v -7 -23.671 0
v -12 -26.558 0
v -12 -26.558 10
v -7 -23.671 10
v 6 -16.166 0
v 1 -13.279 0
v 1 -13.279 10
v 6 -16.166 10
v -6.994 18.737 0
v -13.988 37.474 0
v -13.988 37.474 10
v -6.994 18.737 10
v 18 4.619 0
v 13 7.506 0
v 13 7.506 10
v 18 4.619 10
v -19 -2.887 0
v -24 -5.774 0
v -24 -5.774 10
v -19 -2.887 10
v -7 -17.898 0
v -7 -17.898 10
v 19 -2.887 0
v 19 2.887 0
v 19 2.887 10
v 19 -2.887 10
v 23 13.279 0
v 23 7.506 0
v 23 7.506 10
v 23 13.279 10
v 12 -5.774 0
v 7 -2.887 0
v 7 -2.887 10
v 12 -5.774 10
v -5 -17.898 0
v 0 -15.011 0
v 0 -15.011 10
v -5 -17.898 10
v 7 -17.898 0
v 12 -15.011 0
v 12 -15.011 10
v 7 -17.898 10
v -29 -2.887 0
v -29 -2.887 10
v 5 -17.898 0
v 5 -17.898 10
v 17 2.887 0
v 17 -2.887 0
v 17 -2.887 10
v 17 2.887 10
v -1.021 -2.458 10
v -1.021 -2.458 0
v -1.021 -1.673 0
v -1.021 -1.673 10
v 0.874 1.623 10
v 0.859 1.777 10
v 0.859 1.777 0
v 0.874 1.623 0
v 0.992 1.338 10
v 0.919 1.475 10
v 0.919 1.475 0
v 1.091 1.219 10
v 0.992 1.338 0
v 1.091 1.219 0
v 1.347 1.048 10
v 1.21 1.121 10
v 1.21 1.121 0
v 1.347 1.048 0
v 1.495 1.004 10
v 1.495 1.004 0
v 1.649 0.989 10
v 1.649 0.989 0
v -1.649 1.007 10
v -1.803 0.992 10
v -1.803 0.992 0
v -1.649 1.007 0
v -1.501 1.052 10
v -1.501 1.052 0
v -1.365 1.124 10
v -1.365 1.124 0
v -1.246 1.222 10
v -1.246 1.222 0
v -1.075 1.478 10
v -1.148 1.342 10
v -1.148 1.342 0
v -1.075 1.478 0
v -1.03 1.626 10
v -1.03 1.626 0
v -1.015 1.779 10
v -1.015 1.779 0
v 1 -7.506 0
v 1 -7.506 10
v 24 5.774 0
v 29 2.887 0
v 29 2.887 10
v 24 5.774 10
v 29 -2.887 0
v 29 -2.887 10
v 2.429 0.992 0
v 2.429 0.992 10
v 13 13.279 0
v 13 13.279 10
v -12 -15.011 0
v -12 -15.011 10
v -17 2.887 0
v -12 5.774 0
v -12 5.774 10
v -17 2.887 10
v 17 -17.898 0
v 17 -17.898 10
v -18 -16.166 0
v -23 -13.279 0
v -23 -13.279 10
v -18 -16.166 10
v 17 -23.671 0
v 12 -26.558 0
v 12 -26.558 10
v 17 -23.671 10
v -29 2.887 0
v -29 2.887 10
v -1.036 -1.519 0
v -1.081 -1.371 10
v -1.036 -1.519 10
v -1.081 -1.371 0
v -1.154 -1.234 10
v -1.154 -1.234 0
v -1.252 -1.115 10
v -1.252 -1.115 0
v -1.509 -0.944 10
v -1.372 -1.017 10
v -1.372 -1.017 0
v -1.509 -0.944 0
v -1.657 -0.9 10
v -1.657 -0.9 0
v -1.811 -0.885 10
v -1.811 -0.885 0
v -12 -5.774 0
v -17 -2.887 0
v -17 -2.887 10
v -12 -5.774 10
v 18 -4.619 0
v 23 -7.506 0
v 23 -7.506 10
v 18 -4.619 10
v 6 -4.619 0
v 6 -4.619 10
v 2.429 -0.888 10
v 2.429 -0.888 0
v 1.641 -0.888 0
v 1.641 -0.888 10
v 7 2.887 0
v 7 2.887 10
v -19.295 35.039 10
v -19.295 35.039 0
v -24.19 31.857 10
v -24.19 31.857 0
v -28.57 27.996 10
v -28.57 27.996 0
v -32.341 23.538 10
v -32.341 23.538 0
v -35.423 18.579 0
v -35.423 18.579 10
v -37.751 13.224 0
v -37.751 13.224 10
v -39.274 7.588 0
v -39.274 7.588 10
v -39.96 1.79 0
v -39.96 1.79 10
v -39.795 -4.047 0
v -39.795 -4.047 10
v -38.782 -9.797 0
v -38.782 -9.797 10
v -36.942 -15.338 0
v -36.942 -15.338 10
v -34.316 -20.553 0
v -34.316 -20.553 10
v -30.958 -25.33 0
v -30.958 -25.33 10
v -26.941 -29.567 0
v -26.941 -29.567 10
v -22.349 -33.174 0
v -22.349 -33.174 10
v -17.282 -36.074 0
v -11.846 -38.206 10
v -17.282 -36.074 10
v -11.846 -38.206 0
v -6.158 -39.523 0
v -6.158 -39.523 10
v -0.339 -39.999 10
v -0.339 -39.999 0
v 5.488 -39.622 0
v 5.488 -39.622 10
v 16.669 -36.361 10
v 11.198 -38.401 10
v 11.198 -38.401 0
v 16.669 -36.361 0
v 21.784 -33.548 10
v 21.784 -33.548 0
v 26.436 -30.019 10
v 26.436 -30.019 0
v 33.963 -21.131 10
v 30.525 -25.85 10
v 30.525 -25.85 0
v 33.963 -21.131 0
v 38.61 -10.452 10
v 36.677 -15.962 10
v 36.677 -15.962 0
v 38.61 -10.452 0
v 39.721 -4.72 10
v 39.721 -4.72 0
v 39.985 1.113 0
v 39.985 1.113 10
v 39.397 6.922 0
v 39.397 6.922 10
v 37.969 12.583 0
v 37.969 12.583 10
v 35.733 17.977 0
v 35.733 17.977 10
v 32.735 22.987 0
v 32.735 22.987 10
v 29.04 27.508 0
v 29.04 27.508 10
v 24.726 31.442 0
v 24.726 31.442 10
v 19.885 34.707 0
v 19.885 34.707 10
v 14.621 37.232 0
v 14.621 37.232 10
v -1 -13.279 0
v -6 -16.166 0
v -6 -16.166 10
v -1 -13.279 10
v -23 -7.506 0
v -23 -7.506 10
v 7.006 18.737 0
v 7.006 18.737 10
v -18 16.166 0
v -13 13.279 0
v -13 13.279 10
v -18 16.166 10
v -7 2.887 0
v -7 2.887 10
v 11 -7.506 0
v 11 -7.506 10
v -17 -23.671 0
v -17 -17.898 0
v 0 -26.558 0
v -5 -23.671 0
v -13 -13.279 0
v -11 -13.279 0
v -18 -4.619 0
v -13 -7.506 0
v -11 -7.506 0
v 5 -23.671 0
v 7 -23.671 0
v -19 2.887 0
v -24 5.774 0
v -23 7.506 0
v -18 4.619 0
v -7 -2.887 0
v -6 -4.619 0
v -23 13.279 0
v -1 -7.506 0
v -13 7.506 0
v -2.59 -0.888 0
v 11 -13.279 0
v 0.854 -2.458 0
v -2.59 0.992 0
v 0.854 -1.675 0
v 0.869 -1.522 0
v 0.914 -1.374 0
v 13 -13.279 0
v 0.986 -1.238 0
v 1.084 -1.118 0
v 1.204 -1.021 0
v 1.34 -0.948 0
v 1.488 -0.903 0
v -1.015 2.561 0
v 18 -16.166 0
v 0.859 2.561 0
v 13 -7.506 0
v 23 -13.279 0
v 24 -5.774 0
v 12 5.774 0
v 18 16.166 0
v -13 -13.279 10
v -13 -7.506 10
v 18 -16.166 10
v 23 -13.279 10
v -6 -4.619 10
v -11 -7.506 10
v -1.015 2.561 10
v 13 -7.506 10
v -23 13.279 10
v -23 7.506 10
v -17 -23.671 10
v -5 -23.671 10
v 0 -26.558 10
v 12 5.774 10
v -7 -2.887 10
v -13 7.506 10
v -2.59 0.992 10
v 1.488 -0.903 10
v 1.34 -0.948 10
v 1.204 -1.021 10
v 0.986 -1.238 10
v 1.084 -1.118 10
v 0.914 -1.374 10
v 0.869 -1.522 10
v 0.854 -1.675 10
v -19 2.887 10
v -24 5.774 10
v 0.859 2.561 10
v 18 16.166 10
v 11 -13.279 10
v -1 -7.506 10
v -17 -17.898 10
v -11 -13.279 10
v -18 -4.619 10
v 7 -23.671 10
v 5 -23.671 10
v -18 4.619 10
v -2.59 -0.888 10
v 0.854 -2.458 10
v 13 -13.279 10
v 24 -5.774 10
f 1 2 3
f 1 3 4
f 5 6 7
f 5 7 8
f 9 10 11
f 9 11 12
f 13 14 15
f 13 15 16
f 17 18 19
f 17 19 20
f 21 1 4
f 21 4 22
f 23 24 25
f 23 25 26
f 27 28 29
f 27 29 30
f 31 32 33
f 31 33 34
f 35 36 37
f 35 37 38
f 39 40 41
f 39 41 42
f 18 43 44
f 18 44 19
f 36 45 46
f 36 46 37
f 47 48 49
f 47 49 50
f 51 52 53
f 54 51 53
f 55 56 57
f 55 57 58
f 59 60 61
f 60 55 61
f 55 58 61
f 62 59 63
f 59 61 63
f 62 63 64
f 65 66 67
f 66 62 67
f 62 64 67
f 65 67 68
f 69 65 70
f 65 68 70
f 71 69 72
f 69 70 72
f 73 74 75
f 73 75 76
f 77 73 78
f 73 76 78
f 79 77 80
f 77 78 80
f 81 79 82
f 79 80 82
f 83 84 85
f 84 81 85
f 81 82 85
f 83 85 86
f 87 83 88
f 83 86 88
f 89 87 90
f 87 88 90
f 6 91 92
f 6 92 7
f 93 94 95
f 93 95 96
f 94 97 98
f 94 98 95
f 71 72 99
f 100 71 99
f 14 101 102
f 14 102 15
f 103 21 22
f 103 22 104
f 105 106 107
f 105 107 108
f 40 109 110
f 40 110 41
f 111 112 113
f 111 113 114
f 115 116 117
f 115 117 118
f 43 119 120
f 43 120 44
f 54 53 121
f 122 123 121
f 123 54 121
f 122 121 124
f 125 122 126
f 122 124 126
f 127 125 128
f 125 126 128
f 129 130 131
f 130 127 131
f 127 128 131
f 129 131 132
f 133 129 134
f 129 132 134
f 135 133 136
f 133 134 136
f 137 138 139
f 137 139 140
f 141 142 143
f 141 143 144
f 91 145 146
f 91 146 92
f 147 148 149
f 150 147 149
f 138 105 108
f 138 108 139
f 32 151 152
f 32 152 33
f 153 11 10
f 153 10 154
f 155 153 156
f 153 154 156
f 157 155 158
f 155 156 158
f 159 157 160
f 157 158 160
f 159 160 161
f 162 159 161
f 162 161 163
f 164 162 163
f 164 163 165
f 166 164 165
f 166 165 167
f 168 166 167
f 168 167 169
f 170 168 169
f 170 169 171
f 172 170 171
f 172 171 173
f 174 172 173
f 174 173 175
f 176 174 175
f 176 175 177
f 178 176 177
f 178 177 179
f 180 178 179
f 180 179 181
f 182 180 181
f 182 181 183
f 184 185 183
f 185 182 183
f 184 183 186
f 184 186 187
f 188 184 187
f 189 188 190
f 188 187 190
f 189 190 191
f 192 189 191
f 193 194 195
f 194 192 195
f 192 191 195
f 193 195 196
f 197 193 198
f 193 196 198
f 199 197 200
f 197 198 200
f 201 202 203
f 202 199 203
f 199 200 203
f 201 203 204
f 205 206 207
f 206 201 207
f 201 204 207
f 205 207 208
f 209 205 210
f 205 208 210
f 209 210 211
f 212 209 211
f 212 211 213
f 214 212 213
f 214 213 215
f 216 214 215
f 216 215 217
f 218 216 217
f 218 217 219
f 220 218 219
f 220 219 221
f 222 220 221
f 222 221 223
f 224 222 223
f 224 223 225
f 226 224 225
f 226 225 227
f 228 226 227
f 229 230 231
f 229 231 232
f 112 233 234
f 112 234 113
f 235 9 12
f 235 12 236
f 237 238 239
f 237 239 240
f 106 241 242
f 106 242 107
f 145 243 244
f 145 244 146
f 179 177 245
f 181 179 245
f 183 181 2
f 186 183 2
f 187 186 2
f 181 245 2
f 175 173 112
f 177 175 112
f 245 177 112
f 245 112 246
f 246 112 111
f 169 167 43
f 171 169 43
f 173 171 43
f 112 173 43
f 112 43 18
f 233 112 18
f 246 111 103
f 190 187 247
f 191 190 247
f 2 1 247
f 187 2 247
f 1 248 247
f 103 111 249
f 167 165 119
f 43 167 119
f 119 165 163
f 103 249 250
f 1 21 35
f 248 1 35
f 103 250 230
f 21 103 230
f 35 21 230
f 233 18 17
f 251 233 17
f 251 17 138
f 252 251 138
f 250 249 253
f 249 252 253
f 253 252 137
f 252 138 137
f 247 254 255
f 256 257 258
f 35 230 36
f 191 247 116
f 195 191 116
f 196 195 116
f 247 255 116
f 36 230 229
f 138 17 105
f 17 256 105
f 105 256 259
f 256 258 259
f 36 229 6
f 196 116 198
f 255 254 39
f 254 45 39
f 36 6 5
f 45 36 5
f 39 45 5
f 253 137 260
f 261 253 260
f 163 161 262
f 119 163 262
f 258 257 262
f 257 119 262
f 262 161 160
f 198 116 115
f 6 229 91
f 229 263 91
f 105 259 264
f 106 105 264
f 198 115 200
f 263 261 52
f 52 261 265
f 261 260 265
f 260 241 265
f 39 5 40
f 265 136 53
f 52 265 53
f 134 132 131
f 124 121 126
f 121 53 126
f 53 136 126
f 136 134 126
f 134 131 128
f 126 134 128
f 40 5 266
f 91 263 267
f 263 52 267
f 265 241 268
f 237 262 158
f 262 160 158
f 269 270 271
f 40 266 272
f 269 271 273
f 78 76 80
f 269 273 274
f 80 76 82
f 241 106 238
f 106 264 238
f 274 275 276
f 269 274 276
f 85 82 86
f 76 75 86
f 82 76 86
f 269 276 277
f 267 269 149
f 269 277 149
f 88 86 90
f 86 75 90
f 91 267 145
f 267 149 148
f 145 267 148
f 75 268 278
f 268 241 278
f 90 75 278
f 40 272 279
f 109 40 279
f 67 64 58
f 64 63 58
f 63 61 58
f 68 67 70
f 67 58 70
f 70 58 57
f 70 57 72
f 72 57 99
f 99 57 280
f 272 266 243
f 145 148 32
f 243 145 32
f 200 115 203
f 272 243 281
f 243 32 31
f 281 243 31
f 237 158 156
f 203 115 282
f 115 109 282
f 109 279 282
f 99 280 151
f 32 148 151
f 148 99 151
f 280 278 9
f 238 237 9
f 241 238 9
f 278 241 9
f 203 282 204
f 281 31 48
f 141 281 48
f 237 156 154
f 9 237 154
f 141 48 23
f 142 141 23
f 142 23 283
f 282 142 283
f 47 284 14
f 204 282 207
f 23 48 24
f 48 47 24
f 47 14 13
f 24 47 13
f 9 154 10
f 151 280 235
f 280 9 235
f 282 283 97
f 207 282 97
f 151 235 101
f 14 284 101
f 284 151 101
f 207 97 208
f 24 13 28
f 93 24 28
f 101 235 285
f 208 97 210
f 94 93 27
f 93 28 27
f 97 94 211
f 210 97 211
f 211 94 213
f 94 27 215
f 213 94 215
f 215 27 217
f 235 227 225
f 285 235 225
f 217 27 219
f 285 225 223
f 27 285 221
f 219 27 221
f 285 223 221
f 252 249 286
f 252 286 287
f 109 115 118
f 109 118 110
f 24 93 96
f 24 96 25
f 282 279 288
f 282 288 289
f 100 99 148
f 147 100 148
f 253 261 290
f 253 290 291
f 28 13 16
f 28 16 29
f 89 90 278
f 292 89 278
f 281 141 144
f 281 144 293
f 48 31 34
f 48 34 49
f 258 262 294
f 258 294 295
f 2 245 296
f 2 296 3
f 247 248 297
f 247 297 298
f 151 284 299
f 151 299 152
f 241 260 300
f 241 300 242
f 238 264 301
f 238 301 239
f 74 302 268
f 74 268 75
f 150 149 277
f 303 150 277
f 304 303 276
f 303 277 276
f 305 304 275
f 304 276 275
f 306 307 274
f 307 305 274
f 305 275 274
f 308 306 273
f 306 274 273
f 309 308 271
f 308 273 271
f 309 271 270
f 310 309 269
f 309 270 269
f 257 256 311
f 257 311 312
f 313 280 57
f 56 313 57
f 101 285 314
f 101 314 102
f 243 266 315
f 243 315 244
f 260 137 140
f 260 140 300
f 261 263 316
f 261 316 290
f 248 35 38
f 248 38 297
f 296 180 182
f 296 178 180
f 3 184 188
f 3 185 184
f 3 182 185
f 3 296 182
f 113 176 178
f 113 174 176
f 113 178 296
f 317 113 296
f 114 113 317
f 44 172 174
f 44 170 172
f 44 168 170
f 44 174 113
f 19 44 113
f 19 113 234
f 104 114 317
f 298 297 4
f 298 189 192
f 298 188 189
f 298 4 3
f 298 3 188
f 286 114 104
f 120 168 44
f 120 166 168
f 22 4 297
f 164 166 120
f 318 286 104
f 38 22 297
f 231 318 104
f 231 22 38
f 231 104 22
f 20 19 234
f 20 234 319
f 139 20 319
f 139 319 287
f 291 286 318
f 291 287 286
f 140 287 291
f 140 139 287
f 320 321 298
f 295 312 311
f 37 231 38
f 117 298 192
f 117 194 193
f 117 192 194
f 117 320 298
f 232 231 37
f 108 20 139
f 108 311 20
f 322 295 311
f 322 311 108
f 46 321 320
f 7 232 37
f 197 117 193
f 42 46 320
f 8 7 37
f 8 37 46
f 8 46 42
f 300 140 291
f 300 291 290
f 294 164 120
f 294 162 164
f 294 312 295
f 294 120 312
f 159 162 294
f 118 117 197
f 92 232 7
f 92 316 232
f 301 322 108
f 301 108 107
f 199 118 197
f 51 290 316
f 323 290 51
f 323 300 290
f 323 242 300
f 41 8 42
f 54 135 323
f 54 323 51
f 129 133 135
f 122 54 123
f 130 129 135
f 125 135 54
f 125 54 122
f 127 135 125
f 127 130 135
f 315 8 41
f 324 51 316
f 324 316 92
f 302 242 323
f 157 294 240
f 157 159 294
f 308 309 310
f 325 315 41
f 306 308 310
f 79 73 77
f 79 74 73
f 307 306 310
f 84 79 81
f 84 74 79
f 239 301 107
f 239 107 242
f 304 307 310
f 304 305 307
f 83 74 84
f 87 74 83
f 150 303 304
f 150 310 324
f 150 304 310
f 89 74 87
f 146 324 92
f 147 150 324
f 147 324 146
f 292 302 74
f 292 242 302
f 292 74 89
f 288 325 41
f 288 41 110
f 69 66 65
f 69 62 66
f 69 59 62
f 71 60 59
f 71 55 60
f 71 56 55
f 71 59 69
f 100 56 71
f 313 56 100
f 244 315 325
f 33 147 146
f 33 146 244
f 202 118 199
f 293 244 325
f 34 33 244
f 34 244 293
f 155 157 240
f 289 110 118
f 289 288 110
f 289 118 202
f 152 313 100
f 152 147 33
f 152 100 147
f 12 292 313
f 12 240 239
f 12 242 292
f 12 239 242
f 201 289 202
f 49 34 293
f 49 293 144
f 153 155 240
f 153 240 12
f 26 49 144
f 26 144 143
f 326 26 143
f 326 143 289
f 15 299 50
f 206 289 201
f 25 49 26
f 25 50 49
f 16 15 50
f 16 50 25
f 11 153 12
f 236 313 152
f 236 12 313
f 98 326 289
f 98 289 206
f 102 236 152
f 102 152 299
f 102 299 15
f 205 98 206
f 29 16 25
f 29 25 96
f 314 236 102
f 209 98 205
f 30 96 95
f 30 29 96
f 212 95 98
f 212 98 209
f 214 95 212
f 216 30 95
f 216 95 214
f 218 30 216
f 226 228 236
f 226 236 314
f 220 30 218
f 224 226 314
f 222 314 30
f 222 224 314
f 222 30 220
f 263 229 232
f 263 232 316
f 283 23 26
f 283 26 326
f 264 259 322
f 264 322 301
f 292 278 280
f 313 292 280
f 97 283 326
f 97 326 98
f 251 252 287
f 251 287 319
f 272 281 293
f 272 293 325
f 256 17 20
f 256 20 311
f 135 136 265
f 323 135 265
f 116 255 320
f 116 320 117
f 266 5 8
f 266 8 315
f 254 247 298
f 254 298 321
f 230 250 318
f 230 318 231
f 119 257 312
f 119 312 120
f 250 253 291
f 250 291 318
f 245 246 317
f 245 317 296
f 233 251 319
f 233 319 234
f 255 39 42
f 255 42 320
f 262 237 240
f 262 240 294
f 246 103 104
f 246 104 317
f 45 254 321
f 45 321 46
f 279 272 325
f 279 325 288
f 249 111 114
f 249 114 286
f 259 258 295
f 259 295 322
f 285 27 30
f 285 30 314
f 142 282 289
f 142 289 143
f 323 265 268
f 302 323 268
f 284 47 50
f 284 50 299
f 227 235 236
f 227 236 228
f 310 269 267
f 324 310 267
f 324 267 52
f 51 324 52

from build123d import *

# Parameters (mm, degrees)
SKETCH1_R                = 40
BOSS_EXTRUDE1_DEPTH      = 10
CUT_EXTRUDE8_DEPTH       = 99
CUT_EXTRUDE9_DEPTH       = 58.445626465
CUT_EXTRUDE9_DEPTH_BACK  = 58.445626465
CUT_EXTRUDE10_DEPTH      = 23
CUT_EXTRUDE10_DEPTH_BACK = 58.445626465


with BuildPart() as part:
    # Sketch1 → Boss-Extrude1 (new body)
    with BuildSketch(Plane.XY):
        Circle(SKETCH1_R)
    extrude(amount=BOSS_EXTRUDE1_DEPTH)

    # Sketch1<10> → Cut-Extrude8 (cut)
    with BuildSketch(Plane.XY):
        Polygon((17, 2.886751346), (12, 5.773502692), (7, 2.886751346), (7, -2.886751346), (12, -5.773502692), (17, -2.886751346), align=None)
        Polygon((29, 2.886751346), (24, 5.773502692), (19, 2.886751346), (19, -2.886751346), (24, -5.773502692), (29, -2.886751346), align=None)
        Polygon((-7, 2.886751346), (-12, 5.773502692), (-17, 2.886751346), (-17, -2.886751346), (-12, -5.773502692), (-7, -2.886751346), align=None)
        Polygon((-19, 2.886751346), (-24, 5.773502692), (-29, 2.886751346), (-29, -2.886751346), (-24, -5.773502692), (-19, -2.886751346), align=None)
        Polygon((-13, 13.279056191), (-18, 16.165807537), (-23, 13.279056191), (-23, 7.505553499), (-18, 4.618802154), (-13, 7.505553499), align=None)
        Polygon((23, 7.505553499), (23, 13.279056191), (18, 16.165807537), (13, 13.279056191), (13, 7.505553499), (18, 4.618802154), align=None)
        Polygon((-13, -13.279056191), (-13, -7.505553499), (-18, -4.618802154), (-23, -7.505553499), (-23, -13.279056191), (-18, -16.165807537), align=None)
        Polygon((-11, -13.279056191), (-6, -16.165807537), (-1, -13.279056191), (-1, -7.505553499), (-6, -4.618802154), (-11, -7.505553499), align=None)
        Polygon((6, -16.165807537), (11, -13.279056191), (11, -7.505553499), (6, -4.618802154), (1, -7.505553499), (1, -13.279056191), align=None)
        Polygon((13, -7.505553499), (13, -13.279056191), (18, -16.165807537), (23, -13.279056191), (23, -7.505553499), (18, -4.618802154), align=None)
        Polygon((-17, -23.671361037), (-12, -26.558112383), (-7, -23.671361037), (-7, -17.897858345), (-12, -15.011106999), (-17, -17.897858345), align=None)
        Polygon((0, -26.558112383), (5, -23.671361037), (5, -17.897858345), (0, -15.011106999), (-5, -17.897858345), (-5, -23.671361037), align=None)
        Polygon((7, -17.897858345), (7, -23.671361037), (12, -26.558112383), (17, -23.671361037), (17, -17.897858345), (12, -15.011106999), align=None)
    extrude(amount=CUT_EXTRUDE8_DEPTH, mode=Mode.SUBTRACT)

    # Sketch1<11> → Cut-Extrude9 (cut, two sides: drawn at the far end of the back side and taken through both)
    with BuildSketch(Plane.XY.offset(-CUT_EXTRUDE9_DEPTH_BACK)):
        with BuildLine():
            Line((-6.994087027, 18.73720221), (0, 18.73720221))
            Line((0, 18.73720221), (7.005912973, 18.73720221))
            Line((7.005912973, 18.73720221), (14.620716001, 37.232172427))
            ThreePointArc((14.620716001, 37.232172427), (0.338668589, 39.998566269), (-13.988174054, 37.47440442))
            Line((-13.988174054, 37.47440442), (-6.994087027, 18.73720221))
        make_face()
    extrude(amount=CUT_EXTRUDE9_DEPTH + CUT_EXTRUDE9_DEPTH_BACK, mode=Mode.SUBTRACT)

    # Sketch1<13> → Cut-Extrude10 (cut, two sides: drawn at the far end of the back side and taken through both)
    with BuildSketch(Plane.XY.offset(-CUT_EXTRUDE10_DEPTH_BACK)):
        with BuildLine():
            Line((0.853688676, -2.457553929), (-1.020561324, -2.457553929))
            Line((-1.020561324, -2.457553929), (-1.020561324, -1.672692112))
            ThreePointArc((-1.020561324, -1.672692112), (-1.25214669, -1.114915123), (-1.810695088, -0.885196516))
            Line((-1.810695088, -0.885196516), (-2.590311324, -0.887803929))
            Line((-2.590311324, -0.887803929), (-2.590311324, 0.991696071))
            Line((-2.590311324, 0.991696071), (-1.802811324, 0.991696071))
            ThreePointArc((-1.802811324, 0.991696071), (-1.245964734, 1.222349481), (-1.015311324, 1.779196071))
            Line((-1.015311324, 1.779196071), (-1.015311324, 2.561446071))
            Line((-1.015311324, 2.561446071), (0.858938676, 2.561446071))
            Line((0.858938676, 2.561446071), (0.858938676, 1.776584255))
            ThreePointArc((0.858938676, 1.776584255), (1.090524042, 1.218807266), (1.649072441, 0.989088659))
            Line((1.649072441, 0.989088659), (2.428688676, 0.991696071))
            Line((2.428688676, 0.991696071), (2.428688676, -0.887803929))
            Line((2.428688676, -0.887803929), (1.641188676, -0.887803929))
            ThreePointArc((1.641188676, -0.887803929), (1.084342086, -1.118457338), (0.853688676, -1.675303929))
            Line((0.853688676, -1.675303929), (0.853688676, -2.457553929))
        make_face()
    extrude(amount=CUT_EXTRUDE10_DEPTH + CUT_EXTRUDE10_DEPTH_BACK, mode=Mode.SUBTRACT)


solid = part.part
